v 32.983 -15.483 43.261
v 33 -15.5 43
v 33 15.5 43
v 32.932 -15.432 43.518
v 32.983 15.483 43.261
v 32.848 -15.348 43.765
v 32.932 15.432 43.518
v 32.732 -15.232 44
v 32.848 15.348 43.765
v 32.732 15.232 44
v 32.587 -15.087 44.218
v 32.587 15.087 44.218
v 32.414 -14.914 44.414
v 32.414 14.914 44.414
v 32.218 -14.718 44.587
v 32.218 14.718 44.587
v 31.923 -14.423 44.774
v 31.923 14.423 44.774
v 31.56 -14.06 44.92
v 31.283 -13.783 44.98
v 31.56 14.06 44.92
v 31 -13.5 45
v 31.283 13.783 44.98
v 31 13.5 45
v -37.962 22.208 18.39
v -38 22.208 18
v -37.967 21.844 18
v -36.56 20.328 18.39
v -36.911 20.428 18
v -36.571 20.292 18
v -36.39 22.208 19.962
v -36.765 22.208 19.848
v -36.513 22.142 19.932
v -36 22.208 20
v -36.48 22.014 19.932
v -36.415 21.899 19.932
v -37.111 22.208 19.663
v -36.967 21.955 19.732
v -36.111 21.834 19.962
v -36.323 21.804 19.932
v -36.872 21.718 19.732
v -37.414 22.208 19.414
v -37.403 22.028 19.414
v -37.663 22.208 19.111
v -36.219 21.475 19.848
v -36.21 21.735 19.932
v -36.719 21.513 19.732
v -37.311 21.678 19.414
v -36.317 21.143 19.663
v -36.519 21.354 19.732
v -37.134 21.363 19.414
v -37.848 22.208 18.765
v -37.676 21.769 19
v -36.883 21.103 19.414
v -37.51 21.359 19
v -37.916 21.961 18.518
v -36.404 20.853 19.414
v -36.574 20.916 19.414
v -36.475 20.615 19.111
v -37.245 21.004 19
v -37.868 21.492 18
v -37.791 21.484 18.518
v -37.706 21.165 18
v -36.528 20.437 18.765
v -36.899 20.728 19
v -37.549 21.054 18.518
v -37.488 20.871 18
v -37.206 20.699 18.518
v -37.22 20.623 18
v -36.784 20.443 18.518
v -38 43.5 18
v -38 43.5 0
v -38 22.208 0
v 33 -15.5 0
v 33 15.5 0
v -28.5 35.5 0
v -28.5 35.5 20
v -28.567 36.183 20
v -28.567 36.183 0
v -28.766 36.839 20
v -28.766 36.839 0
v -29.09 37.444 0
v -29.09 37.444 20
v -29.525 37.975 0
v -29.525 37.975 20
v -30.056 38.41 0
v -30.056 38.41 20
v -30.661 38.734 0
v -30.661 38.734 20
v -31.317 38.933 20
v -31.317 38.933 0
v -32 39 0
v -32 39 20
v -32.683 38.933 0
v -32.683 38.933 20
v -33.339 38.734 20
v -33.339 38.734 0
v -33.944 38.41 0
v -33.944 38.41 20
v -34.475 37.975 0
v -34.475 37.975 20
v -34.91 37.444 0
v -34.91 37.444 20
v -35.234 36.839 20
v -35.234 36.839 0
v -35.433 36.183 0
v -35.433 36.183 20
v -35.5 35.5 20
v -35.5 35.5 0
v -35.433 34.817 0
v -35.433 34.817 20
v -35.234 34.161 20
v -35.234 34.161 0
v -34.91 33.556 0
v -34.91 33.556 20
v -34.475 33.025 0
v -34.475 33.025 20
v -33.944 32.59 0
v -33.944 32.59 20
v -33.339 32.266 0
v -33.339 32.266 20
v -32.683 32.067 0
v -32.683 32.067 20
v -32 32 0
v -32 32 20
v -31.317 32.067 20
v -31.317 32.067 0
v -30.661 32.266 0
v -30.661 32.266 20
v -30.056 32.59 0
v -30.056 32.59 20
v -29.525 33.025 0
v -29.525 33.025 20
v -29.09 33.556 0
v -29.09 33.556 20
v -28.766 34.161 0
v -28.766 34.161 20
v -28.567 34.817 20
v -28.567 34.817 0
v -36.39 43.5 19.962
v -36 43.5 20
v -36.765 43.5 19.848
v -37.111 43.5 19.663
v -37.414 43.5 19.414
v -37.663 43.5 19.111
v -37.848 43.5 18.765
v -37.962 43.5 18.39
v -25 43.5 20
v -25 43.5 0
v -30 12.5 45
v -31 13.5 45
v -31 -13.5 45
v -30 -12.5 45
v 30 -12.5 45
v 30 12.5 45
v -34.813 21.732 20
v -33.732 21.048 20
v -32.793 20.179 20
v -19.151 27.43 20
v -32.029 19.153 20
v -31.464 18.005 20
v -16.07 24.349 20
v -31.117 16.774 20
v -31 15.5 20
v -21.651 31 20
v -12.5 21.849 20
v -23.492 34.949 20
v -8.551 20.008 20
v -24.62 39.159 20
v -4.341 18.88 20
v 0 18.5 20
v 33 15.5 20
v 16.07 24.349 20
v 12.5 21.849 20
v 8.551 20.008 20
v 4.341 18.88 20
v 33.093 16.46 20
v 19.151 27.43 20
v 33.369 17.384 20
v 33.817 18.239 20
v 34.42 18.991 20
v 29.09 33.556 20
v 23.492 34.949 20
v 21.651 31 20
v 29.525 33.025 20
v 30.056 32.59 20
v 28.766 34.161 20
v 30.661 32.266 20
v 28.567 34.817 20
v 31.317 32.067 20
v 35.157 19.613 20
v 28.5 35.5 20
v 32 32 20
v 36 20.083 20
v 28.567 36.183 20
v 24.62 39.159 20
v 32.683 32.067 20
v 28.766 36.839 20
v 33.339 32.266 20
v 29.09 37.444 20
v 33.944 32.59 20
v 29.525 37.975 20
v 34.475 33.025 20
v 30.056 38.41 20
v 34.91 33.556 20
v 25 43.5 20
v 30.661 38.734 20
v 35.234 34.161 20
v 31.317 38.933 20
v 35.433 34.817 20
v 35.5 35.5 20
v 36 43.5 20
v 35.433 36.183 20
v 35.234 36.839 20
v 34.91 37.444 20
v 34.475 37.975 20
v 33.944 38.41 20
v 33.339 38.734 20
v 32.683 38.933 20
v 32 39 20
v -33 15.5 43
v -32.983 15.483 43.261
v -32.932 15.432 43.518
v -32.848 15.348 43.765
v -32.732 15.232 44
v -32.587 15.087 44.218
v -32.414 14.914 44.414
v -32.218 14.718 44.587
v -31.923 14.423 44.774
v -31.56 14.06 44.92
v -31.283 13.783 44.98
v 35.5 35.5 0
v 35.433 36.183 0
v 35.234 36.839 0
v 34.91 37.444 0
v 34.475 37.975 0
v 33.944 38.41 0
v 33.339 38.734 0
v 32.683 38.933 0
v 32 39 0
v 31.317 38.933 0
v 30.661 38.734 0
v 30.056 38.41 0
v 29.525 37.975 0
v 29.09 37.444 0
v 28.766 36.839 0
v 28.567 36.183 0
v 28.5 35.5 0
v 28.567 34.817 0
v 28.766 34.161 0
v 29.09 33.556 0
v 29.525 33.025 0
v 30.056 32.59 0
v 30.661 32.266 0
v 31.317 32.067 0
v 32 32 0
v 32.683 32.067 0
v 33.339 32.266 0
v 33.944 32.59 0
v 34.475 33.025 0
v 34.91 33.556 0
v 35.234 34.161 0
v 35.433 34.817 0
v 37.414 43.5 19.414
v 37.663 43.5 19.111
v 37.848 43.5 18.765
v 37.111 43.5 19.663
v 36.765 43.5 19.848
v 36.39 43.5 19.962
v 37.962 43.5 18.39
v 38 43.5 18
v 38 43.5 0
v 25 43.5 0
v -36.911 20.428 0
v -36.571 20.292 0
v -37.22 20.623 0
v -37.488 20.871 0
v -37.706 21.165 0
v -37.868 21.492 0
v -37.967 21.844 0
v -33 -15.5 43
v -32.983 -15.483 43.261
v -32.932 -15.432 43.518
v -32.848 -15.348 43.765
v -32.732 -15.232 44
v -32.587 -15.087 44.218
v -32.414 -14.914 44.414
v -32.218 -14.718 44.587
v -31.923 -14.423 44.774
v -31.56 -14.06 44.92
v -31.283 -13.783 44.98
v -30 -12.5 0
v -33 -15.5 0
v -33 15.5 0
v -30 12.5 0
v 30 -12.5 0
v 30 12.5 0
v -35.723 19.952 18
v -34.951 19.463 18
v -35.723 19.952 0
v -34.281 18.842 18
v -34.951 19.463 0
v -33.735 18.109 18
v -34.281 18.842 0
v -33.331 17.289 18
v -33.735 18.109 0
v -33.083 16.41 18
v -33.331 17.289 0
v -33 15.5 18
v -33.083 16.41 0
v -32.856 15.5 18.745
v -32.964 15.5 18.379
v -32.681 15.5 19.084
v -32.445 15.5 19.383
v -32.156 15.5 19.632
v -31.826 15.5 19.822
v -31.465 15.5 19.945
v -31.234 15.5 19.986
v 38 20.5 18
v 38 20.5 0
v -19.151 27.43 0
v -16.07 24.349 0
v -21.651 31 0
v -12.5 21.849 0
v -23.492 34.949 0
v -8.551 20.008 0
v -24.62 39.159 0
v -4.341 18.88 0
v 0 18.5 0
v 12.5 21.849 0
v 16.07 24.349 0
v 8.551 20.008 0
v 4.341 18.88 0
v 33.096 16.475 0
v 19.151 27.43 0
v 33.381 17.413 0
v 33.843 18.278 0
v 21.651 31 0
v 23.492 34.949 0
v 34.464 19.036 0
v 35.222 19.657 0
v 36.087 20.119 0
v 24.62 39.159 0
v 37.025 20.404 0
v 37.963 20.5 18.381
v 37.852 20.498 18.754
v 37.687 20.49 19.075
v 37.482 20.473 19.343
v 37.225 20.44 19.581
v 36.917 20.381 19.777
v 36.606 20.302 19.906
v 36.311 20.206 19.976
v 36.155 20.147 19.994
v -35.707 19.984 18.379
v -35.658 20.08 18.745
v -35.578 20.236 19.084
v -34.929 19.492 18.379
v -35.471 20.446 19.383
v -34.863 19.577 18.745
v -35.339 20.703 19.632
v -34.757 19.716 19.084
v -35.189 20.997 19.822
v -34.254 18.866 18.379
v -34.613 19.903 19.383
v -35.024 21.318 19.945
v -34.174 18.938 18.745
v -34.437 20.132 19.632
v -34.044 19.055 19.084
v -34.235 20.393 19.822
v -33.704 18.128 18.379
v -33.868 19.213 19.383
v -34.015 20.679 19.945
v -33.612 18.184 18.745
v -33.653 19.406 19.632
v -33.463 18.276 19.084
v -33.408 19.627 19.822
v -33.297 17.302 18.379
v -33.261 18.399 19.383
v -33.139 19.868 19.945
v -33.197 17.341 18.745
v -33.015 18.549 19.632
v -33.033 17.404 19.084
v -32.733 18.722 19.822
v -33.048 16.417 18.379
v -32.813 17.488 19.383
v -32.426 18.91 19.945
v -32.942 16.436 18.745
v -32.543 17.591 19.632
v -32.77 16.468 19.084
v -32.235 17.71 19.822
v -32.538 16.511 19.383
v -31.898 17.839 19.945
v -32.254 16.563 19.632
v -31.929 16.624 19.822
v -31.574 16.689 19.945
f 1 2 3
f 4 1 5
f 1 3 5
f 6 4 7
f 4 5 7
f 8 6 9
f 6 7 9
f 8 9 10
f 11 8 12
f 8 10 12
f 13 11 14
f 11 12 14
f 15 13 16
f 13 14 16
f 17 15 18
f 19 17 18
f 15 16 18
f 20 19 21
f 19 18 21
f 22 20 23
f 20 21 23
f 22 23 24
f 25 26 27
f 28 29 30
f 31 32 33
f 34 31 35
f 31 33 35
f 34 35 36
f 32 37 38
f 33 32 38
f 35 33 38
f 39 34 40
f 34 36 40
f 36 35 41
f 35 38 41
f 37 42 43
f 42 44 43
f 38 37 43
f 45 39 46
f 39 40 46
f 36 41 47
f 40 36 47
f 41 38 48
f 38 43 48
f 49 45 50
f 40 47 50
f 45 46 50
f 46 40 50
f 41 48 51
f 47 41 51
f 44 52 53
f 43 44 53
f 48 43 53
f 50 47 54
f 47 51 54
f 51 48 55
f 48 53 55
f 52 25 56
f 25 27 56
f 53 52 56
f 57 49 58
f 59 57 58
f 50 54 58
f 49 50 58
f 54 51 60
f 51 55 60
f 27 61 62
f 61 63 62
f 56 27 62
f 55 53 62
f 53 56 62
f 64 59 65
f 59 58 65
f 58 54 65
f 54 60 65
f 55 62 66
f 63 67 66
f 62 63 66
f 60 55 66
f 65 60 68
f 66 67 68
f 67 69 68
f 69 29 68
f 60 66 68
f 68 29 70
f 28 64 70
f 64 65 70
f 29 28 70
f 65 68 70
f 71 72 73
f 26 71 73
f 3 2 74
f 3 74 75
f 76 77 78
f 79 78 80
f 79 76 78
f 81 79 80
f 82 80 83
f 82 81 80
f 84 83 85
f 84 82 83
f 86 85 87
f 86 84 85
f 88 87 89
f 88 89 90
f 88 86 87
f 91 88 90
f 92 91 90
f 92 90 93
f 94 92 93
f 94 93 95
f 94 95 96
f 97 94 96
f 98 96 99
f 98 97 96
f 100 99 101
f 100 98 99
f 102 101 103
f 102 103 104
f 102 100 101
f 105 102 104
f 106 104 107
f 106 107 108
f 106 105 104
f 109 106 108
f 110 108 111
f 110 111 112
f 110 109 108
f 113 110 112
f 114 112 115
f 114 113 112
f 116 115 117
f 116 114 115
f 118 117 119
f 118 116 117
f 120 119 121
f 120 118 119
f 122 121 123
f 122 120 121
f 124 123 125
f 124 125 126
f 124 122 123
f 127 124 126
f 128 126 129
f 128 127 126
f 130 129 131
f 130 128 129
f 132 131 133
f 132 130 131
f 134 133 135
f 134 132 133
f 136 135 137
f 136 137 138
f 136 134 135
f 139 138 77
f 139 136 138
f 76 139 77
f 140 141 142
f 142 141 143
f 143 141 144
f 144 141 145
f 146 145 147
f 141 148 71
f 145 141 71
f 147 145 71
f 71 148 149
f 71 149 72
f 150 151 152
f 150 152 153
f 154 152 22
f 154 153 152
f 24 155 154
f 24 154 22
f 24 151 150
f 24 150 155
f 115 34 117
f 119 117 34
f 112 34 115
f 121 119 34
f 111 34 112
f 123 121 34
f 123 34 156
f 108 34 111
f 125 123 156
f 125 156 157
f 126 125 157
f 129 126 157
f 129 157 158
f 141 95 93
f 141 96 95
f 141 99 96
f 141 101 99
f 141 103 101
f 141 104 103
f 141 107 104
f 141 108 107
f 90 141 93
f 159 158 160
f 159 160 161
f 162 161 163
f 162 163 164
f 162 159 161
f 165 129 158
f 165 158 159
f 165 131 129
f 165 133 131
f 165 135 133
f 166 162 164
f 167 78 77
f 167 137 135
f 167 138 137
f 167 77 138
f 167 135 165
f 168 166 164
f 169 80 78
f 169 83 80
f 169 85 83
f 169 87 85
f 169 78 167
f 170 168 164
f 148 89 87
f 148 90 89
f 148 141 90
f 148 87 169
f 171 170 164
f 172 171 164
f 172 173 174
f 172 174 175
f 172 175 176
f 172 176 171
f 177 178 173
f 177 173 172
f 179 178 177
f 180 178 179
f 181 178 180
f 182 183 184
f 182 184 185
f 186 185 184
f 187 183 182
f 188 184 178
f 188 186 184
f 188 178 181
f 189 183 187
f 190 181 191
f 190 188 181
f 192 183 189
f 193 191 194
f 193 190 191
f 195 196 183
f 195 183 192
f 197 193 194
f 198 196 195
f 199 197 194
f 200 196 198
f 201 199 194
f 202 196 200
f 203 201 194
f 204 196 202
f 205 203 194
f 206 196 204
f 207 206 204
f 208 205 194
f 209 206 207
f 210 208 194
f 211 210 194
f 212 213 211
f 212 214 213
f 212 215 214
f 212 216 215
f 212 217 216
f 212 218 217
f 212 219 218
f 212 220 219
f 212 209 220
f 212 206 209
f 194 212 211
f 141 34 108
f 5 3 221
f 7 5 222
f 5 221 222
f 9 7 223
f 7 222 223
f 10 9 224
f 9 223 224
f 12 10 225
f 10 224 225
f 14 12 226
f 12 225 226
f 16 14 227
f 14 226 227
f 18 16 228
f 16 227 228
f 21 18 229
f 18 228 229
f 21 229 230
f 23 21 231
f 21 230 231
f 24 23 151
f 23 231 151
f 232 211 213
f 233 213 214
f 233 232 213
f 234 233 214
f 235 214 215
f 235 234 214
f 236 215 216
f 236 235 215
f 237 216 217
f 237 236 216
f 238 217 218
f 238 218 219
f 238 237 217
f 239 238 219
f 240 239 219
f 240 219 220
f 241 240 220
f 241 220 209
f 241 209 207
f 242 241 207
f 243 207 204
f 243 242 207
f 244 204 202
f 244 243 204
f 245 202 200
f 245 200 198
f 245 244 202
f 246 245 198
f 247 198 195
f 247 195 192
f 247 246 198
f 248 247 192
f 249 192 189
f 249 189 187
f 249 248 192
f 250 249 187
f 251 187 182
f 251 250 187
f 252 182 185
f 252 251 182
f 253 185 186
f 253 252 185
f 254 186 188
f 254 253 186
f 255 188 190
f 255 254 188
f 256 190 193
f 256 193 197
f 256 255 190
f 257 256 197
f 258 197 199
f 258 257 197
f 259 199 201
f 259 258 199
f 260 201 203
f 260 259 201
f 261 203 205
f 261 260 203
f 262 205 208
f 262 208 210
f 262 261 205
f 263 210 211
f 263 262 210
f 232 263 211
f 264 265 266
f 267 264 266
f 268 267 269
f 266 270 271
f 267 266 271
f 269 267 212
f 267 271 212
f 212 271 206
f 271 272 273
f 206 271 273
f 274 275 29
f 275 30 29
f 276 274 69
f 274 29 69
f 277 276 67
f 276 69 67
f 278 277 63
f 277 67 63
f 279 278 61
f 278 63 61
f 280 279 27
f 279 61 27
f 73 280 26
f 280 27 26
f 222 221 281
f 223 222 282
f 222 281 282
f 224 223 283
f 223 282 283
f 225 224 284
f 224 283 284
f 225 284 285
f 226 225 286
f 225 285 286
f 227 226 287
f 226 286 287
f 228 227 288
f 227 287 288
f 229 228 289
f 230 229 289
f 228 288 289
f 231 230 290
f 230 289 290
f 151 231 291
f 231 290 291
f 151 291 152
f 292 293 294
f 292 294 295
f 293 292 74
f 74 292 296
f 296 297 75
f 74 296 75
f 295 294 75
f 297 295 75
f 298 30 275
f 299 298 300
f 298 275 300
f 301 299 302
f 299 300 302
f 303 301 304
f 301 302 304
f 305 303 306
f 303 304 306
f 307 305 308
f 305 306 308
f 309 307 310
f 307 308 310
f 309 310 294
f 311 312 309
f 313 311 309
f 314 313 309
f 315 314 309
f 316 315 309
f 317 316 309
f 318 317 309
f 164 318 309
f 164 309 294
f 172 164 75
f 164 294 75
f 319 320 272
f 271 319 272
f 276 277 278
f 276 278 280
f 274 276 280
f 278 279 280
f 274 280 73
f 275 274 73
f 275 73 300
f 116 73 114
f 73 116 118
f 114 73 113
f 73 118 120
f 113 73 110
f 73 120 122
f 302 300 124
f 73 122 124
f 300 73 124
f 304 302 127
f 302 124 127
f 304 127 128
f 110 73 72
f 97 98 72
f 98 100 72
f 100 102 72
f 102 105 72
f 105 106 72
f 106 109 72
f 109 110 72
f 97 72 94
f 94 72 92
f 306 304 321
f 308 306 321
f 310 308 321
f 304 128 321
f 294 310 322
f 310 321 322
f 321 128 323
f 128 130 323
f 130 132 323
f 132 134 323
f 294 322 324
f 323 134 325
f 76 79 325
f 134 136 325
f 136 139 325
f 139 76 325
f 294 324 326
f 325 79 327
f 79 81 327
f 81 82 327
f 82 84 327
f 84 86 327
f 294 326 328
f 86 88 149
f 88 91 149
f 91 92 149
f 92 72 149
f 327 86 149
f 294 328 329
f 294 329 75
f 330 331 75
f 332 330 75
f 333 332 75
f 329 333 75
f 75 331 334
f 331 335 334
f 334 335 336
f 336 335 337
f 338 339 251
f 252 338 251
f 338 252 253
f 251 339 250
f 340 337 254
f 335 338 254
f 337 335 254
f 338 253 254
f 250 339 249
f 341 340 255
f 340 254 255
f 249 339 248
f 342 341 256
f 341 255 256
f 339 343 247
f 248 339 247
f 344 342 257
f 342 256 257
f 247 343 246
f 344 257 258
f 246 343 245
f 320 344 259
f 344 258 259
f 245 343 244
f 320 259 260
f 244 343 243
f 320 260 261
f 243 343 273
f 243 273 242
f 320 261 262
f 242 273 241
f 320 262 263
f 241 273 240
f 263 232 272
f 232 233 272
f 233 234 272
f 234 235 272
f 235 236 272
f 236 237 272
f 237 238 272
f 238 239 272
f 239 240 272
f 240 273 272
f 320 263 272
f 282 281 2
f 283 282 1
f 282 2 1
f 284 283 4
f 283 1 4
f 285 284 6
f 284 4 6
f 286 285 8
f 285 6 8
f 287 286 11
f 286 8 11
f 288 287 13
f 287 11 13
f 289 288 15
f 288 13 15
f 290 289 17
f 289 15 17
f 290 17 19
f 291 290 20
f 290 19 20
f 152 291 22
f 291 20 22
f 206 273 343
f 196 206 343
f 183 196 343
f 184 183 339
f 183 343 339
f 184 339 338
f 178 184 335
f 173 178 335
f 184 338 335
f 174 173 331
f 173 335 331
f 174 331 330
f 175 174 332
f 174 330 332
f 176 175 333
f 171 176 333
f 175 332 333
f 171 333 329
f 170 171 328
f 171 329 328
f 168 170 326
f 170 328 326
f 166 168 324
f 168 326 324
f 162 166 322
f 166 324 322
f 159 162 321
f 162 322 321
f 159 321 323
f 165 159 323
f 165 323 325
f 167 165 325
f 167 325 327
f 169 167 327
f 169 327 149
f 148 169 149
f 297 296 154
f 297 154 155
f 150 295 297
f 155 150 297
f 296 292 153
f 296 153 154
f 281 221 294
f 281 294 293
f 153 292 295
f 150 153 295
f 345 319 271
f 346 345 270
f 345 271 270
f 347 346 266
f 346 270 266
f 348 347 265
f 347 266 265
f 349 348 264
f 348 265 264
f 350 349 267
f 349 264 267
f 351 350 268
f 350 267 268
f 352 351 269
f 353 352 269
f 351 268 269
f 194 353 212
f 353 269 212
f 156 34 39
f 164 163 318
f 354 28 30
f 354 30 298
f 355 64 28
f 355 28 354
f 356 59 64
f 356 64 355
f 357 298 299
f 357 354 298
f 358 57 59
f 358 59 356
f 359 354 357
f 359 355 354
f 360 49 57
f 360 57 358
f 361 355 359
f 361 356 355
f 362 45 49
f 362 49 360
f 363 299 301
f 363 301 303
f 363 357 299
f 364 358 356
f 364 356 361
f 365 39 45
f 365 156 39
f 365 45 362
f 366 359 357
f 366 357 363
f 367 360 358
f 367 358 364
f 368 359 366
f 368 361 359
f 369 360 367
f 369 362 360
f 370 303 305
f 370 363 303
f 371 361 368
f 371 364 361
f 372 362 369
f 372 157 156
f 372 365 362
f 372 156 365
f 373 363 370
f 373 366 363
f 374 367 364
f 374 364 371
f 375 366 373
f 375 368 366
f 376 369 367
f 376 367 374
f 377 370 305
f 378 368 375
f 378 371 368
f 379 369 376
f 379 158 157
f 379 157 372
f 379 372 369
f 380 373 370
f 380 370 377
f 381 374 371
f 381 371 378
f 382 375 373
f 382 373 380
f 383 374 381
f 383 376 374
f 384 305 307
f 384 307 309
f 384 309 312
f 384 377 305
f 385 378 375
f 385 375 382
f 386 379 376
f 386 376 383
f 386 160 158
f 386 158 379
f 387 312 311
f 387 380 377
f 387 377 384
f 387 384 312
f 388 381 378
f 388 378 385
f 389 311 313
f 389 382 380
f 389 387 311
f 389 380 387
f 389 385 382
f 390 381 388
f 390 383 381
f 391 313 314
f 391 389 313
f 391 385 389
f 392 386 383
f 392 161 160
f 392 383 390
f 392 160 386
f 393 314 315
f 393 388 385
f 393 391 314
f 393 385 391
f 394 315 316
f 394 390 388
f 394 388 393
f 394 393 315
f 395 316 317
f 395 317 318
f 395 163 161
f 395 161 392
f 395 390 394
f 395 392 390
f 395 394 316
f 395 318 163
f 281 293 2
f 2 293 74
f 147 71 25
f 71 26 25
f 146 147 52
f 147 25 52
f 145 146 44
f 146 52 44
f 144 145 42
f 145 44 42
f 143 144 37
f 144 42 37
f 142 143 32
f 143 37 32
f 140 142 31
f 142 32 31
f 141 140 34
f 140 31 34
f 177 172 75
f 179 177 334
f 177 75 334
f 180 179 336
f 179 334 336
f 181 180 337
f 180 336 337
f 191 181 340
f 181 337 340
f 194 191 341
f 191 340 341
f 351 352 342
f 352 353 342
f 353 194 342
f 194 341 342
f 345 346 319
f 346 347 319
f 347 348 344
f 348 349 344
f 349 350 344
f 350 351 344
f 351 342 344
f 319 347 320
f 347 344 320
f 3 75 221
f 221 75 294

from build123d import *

# Parameters (mm, degrees)
F0_W     = 60
F0_H     = 25
F1_DEPTH = 45
F0_R     = 3.5
F2_DEPTH = 20
F4_R     = 2
F4_2_R   = 2


# Not quite as in the source:
# - a feature of the source that left no trace in its solid (it failed there, or was rolled back) is left out


with BuildPart() as f1:
    # F0 (on Top) → F1 (new body)
    with BuildSketch(Plane.XY):
        Polygon((-33, -15.5), (33, -15.5), (33, 15.5), (0, 15.5), (-33, 15.5), align=None)
        Rectangle(F0_W, F0_H, mode=Mode.SUBTRACT)
    extrude(amount=F1_DEPTH)

    # F4#2
    f4_2_edges = [f1.edges().sort_by_distance(p)[0] for p in [
        (0, -15.5, 45),
        (33, 0, 45),
        (0, 15.5, 45),
        (-33, 0, 45),
    ]]
    fillet(f4_2_edges, radius=F4_2_R)


with BuildPart() as f2:
    # F0 (on Top) → F2 (new body)
    with BuildSketch(Plane.XY):
        with BuildLine():
            Line((0, 15.5), (33, 15.5))
            ThreePointArc((33, 15.5), (34.4644660941, 19.0355339059), (38, 20.5))
            Line((38, 20.5), (38, 43.5))
            Line((38, 43.5), (28, 43.5))
            ThreePointArc((28, 43.5), (19.7989898732, 23.7010101268), (0, 15.5))
        make_face()
        with Locations((32, 35.5)):
            Circle(F0_R, mode=Mode.SUBTRACT)
        with BuildLine():
            ThreePointArc((-28, 43.5), (-19.7989898732, 23.7010101268), (0, 15.5))
            ThreePointArc((0, 15.5), (19.7989898732, 23.7010101268), (28, 43.5))
            Line((28, 43.5), (25, 43.5))
            ThreePointArc((25, 43.5), (0, 18.5), (-25, 43.5))
            Line((-25, 43.5), (-28, 43.5))
        make_face()
        with BuildLine():
            ThreePointArc((-38, 20.5), (-34.4644660941, 19.0355339059), (-33, 15.5))
            Line((-33, 15.5), (0, 15.5))
            ThreePointArc((0, 15.5), (-19.7989898732, 23.7010101268), (-28, 43.5))
            Line((-28, 43.5), (-38, 43.5))
            Line((-38, 43.5), (-38, 20.5))
        make_face()
        with Locations((-32, 35.5)):
            Circle(F0_R, mode=Mode.SUBTRACT)
    extrude(amount=F2_DEPTH)

    # F4
    f4_edges = [f2.edges().sort_by_distance(p)[0] for p in [
        (-38, 20.5, 10),
        (38, 32, 20),
        (-38, 32, 20),
        (-34.464466, 19.035534, 20),
    ]]
    fillet(f4_edges, radius=F4_R)


solid = Compound([f1.part, f2.part])
